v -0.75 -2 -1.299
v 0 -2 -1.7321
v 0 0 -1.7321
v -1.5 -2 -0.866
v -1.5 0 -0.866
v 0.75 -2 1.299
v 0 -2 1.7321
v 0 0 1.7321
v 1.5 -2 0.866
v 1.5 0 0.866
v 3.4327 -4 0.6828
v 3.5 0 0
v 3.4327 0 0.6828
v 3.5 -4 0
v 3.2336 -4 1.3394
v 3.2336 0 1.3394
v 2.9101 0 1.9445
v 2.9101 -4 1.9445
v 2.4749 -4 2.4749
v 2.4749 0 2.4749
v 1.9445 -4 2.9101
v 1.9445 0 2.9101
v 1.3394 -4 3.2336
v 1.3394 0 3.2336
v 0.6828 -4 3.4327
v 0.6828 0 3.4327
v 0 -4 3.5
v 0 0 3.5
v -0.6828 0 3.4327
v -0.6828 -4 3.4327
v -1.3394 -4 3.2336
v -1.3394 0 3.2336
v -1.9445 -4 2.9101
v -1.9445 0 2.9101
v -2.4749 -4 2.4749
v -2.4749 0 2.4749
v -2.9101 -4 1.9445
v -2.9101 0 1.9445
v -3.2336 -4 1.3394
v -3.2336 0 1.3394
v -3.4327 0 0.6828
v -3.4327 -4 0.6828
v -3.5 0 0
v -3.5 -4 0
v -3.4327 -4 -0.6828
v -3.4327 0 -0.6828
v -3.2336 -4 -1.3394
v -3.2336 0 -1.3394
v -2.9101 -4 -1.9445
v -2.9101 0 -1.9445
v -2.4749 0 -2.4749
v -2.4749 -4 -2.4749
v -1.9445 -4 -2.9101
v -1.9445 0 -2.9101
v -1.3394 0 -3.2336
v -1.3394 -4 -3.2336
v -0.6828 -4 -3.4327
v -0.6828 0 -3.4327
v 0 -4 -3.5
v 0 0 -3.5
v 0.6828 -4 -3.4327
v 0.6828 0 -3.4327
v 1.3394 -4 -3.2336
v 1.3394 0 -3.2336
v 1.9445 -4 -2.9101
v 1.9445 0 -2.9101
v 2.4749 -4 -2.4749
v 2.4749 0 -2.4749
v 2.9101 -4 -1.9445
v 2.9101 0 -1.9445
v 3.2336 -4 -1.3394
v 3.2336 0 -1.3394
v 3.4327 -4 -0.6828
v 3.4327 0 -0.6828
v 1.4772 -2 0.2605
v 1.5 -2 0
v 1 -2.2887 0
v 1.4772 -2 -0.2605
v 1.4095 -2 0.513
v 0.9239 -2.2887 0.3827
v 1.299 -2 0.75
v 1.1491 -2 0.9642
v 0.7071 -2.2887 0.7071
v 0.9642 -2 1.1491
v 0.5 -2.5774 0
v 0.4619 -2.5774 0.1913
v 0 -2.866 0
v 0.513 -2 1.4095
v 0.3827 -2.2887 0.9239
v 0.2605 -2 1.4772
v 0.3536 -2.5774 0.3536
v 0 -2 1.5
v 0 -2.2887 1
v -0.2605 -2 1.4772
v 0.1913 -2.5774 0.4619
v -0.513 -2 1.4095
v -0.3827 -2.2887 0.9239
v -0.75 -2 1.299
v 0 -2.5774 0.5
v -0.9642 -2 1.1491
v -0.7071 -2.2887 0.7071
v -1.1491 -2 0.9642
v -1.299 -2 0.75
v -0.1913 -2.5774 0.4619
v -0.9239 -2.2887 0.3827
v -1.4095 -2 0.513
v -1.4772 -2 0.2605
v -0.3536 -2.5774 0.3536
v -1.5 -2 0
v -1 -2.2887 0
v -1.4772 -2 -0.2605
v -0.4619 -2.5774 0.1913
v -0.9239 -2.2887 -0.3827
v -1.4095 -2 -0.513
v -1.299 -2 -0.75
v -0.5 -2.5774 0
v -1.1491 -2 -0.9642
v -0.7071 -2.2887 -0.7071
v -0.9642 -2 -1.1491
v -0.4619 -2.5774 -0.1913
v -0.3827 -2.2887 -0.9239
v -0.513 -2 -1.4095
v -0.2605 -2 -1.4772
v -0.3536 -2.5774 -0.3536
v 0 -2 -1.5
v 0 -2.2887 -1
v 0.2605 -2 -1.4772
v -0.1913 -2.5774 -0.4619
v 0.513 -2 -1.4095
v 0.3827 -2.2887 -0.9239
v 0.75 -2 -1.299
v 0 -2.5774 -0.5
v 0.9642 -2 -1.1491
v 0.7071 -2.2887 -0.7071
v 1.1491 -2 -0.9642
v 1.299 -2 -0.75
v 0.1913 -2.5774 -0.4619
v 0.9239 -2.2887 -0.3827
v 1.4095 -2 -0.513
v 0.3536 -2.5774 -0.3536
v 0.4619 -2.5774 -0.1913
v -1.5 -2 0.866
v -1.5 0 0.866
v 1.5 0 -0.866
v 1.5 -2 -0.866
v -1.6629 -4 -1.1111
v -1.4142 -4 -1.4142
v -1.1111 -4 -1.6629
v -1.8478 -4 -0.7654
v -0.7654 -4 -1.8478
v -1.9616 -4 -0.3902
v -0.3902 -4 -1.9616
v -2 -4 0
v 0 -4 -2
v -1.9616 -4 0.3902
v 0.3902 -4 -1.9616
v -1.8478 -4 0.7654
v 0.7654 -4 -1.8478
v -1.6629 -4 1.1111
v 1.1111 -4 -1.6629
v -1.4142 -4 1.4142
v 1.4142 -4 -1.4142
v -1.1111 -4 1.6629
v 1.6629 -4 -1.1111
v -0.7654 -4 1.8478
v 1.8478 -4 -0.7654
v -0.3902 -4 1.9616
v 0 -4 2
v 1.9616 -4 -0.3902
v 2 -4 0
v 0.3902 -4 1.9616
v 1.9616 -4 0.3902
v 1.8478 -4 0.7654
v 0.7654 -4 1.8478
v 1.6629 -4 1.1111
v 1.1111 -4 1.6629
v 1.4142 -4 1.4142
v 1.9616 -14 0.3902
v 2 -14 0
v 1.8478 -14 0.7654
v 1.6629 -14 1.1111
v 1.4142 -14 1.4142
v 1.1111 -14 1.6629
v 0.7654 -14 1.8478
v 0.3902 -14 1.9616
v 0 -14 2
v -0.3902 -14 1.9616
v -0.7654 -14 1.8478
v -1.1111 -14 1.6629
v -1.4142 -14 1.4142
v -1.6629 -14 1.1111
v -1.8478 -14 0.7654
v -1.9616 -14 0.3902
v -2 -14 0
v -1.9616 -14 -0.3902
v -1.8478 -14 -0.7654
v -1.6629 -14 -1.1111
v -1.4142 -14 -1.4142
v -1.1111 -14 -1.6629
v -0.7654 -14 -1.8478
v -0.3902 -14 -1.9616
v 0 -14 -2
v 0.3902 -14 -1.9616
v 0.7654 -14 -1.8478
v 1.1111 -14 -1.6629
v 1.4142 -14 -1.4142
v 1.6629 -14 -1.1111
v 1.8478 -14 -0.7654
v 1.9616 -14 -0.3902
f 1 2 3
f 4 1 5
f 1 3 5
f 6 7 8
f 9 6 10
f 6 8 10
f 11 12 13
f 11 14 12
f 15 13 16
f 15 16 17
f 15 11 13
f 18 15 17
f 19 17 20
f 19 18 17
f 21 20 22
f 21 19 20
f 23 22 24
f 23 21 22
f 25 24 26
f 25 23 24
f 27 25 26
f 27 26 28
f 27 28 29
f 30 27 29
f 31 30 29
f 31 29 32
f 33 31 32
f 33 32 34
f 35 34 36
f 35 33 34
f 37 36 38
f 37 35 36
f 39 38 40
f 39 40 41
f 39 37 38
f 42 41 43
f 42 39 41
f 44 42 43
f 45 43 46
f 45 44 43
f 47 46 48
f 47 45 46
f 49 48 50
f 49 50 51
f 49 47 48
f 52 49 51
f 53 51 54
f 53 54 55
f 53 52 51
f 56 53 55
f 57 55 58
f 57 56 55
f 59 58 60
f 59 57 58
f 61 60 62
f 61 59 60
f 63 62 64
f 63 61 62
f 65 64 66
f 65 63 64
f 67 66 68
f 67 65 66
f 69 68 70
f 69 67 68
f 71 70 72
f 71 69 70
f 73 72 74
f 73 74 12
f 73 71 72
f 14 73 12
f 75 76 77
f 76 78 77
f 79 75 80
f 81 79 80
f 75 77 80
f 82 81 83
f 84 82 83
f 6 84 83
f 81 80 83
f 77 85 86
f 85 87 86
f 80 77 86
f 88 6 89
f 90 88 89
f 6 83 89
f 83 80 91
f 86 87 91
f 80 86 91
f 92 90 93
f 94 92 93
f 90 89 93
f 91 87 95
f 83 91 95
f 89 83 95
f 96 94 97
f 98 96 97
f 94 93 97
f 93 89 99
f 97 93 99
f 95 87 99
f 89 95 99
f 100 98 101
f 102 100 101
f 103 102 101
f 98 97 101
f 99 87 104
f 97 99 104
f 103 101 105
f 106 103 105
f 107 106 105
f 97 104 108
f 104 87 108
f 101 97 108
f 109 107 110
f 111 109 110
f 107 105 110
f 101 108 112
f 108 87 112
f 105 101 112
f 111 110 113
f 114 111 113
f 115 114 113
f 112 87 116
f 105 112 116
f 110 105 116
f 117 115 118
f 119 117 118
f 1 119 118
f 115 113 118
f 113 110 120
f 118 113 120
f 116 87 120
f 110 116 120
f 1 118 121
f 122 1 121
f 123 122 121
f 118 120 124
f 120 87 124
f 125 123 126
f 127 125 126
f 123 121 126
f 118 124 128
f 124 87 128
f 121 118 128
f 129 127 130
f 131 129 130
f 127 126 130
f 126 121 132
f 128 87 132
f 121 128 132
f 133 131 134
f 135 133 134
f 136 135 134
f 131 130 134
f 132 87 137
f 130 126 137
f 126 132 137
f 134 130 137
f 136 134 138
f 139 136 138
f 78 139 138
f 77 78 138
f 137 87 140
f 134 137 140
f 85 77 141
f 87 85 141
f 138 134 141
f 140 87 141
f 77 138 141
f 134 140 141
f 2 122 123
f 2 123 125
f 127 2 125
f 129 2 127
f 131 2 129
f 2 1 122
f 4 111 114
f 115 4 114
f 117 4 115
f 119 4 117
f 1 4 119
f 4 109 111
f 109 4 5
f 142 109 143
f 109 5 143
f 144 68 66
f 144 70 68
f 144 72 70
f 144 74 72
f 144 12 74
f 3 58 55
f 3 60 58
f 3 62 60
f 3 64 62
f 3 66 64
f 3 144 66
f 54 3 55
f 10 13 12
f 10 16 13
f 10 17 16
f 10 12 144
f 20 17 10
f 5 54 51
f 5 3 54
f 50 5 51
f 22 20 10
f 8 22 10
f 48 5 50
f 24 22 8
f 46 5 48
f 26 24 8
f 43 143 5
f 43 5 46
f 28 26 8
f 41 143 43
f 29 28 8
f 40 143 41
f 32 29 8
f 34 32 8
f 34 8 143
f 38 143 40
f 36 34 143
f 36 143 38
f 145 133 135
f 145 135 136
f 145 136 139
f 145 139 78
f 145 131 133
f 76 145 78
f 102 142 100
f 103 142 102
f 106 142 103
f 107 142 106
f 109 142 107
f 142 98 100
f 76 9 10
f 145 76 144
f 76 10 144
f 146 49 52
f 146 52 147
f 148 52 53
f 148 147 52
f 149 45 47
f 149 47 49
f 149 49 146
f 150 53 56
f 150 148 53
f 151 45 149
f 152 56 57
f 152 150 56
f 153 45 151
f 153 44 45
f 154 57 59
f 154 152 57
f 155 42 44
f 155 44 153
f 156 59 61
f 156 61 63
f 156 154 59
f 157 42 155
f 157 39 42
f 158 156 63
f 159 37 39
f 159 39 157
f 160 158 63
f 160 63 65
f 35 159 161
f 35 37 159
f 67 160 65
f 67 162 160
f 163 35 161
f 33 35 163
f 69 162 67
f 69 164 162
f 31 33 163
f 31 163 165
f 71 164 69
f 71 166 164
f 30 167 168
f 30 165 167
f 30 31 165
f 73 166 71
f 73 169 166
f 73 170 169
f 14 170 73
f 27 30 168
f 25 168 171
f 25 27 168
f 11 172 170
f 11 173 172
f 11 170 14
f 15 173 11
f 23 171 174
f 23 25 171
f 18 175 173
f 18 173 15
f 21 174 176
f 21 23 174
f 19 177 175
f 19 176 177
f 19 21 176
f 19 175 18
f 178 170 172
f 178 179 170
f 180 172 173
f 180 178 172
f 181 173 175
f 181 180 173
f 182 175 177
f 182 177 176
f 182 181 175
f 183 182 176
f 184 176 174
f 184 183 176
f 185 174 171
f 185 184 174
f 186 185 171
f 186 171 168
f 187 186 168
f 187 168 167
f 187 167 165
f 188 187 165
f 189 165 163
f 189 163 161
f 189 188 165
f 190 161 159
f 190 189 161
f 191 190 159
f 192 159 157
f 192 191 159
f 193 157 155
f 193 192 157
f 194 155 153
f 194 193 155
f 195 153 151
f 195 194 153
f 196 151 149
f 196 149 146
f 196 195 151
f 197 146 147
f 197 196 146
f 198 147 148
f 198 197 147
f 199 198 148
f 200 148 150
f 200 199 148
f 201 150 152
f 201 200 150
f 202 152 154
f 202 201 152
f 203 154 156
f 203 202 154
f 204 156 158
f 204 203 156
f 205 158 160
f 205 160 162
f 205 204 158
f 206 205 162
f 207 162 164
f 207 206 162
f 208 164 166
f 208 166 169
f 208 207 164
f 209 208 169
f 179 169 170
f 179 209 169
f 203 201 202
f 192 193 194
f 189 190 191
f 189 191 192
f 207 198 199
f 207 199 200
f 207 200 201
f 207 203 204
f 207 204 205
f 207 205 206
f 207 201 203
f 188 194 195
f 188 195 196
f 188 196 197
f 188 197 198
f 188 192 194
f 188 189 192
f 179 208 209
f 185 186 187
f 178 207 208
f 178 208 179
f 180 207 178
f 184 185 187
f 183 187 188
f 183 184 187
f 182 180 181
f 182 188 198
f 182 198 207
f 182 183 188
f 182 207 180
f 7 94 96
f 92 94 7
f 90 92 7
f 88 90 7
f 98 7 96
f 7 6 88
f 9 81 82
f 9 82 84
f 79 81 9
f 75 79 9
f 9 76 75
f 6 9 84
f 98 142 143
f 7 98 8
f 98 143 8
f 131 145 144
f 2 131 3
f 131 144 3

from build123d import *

# Parameters (mm, degrees)
CUT_EXTRUDE1_DEPTH = 2


with BuildPart() as part:
    # Sketch1 → Revolve1 (revolve)
    with BuildSketch(Plane.XY):
        Polygon((0, 0), (3.5, 0), (3.5, -4), (2, -4), (2, -14), (0, -14), align=None)
    revolve(axis=Axis((0, 0, 0), (0, -1, 0)))

    # Sketch2 → Cut-Revolve1 (revolve, cut)
    with BuildSketch(Plane.XY):
        Polygon((1.5, 0), (1.5, -2), (0, -2.866025404), (0, 0), align=None)
    revolve(axis=Axis((0, 0, 0), (0, -1, 0)), mode=Mode.SUBTRACT)

    # Sketch3 → Cut-Extrude1 (cut)
    with BuildSketch(Plane(origin=(0, 0, 0), x_dir=(1, 0, 0), z_dir=(0, 1, 0))):
        Polygon((0, 1.732050808), (-1.5, 0.866025404), (-1.5, -0.866025404), (0, -1.732050808), (1.5, -0.866025404), (1.5, 0.866025404), align=None)
    extrude(amount=-CUT_EXTRUDE1_DEPTH, mode=Mode.SUBTRACT)


solid = part.part
